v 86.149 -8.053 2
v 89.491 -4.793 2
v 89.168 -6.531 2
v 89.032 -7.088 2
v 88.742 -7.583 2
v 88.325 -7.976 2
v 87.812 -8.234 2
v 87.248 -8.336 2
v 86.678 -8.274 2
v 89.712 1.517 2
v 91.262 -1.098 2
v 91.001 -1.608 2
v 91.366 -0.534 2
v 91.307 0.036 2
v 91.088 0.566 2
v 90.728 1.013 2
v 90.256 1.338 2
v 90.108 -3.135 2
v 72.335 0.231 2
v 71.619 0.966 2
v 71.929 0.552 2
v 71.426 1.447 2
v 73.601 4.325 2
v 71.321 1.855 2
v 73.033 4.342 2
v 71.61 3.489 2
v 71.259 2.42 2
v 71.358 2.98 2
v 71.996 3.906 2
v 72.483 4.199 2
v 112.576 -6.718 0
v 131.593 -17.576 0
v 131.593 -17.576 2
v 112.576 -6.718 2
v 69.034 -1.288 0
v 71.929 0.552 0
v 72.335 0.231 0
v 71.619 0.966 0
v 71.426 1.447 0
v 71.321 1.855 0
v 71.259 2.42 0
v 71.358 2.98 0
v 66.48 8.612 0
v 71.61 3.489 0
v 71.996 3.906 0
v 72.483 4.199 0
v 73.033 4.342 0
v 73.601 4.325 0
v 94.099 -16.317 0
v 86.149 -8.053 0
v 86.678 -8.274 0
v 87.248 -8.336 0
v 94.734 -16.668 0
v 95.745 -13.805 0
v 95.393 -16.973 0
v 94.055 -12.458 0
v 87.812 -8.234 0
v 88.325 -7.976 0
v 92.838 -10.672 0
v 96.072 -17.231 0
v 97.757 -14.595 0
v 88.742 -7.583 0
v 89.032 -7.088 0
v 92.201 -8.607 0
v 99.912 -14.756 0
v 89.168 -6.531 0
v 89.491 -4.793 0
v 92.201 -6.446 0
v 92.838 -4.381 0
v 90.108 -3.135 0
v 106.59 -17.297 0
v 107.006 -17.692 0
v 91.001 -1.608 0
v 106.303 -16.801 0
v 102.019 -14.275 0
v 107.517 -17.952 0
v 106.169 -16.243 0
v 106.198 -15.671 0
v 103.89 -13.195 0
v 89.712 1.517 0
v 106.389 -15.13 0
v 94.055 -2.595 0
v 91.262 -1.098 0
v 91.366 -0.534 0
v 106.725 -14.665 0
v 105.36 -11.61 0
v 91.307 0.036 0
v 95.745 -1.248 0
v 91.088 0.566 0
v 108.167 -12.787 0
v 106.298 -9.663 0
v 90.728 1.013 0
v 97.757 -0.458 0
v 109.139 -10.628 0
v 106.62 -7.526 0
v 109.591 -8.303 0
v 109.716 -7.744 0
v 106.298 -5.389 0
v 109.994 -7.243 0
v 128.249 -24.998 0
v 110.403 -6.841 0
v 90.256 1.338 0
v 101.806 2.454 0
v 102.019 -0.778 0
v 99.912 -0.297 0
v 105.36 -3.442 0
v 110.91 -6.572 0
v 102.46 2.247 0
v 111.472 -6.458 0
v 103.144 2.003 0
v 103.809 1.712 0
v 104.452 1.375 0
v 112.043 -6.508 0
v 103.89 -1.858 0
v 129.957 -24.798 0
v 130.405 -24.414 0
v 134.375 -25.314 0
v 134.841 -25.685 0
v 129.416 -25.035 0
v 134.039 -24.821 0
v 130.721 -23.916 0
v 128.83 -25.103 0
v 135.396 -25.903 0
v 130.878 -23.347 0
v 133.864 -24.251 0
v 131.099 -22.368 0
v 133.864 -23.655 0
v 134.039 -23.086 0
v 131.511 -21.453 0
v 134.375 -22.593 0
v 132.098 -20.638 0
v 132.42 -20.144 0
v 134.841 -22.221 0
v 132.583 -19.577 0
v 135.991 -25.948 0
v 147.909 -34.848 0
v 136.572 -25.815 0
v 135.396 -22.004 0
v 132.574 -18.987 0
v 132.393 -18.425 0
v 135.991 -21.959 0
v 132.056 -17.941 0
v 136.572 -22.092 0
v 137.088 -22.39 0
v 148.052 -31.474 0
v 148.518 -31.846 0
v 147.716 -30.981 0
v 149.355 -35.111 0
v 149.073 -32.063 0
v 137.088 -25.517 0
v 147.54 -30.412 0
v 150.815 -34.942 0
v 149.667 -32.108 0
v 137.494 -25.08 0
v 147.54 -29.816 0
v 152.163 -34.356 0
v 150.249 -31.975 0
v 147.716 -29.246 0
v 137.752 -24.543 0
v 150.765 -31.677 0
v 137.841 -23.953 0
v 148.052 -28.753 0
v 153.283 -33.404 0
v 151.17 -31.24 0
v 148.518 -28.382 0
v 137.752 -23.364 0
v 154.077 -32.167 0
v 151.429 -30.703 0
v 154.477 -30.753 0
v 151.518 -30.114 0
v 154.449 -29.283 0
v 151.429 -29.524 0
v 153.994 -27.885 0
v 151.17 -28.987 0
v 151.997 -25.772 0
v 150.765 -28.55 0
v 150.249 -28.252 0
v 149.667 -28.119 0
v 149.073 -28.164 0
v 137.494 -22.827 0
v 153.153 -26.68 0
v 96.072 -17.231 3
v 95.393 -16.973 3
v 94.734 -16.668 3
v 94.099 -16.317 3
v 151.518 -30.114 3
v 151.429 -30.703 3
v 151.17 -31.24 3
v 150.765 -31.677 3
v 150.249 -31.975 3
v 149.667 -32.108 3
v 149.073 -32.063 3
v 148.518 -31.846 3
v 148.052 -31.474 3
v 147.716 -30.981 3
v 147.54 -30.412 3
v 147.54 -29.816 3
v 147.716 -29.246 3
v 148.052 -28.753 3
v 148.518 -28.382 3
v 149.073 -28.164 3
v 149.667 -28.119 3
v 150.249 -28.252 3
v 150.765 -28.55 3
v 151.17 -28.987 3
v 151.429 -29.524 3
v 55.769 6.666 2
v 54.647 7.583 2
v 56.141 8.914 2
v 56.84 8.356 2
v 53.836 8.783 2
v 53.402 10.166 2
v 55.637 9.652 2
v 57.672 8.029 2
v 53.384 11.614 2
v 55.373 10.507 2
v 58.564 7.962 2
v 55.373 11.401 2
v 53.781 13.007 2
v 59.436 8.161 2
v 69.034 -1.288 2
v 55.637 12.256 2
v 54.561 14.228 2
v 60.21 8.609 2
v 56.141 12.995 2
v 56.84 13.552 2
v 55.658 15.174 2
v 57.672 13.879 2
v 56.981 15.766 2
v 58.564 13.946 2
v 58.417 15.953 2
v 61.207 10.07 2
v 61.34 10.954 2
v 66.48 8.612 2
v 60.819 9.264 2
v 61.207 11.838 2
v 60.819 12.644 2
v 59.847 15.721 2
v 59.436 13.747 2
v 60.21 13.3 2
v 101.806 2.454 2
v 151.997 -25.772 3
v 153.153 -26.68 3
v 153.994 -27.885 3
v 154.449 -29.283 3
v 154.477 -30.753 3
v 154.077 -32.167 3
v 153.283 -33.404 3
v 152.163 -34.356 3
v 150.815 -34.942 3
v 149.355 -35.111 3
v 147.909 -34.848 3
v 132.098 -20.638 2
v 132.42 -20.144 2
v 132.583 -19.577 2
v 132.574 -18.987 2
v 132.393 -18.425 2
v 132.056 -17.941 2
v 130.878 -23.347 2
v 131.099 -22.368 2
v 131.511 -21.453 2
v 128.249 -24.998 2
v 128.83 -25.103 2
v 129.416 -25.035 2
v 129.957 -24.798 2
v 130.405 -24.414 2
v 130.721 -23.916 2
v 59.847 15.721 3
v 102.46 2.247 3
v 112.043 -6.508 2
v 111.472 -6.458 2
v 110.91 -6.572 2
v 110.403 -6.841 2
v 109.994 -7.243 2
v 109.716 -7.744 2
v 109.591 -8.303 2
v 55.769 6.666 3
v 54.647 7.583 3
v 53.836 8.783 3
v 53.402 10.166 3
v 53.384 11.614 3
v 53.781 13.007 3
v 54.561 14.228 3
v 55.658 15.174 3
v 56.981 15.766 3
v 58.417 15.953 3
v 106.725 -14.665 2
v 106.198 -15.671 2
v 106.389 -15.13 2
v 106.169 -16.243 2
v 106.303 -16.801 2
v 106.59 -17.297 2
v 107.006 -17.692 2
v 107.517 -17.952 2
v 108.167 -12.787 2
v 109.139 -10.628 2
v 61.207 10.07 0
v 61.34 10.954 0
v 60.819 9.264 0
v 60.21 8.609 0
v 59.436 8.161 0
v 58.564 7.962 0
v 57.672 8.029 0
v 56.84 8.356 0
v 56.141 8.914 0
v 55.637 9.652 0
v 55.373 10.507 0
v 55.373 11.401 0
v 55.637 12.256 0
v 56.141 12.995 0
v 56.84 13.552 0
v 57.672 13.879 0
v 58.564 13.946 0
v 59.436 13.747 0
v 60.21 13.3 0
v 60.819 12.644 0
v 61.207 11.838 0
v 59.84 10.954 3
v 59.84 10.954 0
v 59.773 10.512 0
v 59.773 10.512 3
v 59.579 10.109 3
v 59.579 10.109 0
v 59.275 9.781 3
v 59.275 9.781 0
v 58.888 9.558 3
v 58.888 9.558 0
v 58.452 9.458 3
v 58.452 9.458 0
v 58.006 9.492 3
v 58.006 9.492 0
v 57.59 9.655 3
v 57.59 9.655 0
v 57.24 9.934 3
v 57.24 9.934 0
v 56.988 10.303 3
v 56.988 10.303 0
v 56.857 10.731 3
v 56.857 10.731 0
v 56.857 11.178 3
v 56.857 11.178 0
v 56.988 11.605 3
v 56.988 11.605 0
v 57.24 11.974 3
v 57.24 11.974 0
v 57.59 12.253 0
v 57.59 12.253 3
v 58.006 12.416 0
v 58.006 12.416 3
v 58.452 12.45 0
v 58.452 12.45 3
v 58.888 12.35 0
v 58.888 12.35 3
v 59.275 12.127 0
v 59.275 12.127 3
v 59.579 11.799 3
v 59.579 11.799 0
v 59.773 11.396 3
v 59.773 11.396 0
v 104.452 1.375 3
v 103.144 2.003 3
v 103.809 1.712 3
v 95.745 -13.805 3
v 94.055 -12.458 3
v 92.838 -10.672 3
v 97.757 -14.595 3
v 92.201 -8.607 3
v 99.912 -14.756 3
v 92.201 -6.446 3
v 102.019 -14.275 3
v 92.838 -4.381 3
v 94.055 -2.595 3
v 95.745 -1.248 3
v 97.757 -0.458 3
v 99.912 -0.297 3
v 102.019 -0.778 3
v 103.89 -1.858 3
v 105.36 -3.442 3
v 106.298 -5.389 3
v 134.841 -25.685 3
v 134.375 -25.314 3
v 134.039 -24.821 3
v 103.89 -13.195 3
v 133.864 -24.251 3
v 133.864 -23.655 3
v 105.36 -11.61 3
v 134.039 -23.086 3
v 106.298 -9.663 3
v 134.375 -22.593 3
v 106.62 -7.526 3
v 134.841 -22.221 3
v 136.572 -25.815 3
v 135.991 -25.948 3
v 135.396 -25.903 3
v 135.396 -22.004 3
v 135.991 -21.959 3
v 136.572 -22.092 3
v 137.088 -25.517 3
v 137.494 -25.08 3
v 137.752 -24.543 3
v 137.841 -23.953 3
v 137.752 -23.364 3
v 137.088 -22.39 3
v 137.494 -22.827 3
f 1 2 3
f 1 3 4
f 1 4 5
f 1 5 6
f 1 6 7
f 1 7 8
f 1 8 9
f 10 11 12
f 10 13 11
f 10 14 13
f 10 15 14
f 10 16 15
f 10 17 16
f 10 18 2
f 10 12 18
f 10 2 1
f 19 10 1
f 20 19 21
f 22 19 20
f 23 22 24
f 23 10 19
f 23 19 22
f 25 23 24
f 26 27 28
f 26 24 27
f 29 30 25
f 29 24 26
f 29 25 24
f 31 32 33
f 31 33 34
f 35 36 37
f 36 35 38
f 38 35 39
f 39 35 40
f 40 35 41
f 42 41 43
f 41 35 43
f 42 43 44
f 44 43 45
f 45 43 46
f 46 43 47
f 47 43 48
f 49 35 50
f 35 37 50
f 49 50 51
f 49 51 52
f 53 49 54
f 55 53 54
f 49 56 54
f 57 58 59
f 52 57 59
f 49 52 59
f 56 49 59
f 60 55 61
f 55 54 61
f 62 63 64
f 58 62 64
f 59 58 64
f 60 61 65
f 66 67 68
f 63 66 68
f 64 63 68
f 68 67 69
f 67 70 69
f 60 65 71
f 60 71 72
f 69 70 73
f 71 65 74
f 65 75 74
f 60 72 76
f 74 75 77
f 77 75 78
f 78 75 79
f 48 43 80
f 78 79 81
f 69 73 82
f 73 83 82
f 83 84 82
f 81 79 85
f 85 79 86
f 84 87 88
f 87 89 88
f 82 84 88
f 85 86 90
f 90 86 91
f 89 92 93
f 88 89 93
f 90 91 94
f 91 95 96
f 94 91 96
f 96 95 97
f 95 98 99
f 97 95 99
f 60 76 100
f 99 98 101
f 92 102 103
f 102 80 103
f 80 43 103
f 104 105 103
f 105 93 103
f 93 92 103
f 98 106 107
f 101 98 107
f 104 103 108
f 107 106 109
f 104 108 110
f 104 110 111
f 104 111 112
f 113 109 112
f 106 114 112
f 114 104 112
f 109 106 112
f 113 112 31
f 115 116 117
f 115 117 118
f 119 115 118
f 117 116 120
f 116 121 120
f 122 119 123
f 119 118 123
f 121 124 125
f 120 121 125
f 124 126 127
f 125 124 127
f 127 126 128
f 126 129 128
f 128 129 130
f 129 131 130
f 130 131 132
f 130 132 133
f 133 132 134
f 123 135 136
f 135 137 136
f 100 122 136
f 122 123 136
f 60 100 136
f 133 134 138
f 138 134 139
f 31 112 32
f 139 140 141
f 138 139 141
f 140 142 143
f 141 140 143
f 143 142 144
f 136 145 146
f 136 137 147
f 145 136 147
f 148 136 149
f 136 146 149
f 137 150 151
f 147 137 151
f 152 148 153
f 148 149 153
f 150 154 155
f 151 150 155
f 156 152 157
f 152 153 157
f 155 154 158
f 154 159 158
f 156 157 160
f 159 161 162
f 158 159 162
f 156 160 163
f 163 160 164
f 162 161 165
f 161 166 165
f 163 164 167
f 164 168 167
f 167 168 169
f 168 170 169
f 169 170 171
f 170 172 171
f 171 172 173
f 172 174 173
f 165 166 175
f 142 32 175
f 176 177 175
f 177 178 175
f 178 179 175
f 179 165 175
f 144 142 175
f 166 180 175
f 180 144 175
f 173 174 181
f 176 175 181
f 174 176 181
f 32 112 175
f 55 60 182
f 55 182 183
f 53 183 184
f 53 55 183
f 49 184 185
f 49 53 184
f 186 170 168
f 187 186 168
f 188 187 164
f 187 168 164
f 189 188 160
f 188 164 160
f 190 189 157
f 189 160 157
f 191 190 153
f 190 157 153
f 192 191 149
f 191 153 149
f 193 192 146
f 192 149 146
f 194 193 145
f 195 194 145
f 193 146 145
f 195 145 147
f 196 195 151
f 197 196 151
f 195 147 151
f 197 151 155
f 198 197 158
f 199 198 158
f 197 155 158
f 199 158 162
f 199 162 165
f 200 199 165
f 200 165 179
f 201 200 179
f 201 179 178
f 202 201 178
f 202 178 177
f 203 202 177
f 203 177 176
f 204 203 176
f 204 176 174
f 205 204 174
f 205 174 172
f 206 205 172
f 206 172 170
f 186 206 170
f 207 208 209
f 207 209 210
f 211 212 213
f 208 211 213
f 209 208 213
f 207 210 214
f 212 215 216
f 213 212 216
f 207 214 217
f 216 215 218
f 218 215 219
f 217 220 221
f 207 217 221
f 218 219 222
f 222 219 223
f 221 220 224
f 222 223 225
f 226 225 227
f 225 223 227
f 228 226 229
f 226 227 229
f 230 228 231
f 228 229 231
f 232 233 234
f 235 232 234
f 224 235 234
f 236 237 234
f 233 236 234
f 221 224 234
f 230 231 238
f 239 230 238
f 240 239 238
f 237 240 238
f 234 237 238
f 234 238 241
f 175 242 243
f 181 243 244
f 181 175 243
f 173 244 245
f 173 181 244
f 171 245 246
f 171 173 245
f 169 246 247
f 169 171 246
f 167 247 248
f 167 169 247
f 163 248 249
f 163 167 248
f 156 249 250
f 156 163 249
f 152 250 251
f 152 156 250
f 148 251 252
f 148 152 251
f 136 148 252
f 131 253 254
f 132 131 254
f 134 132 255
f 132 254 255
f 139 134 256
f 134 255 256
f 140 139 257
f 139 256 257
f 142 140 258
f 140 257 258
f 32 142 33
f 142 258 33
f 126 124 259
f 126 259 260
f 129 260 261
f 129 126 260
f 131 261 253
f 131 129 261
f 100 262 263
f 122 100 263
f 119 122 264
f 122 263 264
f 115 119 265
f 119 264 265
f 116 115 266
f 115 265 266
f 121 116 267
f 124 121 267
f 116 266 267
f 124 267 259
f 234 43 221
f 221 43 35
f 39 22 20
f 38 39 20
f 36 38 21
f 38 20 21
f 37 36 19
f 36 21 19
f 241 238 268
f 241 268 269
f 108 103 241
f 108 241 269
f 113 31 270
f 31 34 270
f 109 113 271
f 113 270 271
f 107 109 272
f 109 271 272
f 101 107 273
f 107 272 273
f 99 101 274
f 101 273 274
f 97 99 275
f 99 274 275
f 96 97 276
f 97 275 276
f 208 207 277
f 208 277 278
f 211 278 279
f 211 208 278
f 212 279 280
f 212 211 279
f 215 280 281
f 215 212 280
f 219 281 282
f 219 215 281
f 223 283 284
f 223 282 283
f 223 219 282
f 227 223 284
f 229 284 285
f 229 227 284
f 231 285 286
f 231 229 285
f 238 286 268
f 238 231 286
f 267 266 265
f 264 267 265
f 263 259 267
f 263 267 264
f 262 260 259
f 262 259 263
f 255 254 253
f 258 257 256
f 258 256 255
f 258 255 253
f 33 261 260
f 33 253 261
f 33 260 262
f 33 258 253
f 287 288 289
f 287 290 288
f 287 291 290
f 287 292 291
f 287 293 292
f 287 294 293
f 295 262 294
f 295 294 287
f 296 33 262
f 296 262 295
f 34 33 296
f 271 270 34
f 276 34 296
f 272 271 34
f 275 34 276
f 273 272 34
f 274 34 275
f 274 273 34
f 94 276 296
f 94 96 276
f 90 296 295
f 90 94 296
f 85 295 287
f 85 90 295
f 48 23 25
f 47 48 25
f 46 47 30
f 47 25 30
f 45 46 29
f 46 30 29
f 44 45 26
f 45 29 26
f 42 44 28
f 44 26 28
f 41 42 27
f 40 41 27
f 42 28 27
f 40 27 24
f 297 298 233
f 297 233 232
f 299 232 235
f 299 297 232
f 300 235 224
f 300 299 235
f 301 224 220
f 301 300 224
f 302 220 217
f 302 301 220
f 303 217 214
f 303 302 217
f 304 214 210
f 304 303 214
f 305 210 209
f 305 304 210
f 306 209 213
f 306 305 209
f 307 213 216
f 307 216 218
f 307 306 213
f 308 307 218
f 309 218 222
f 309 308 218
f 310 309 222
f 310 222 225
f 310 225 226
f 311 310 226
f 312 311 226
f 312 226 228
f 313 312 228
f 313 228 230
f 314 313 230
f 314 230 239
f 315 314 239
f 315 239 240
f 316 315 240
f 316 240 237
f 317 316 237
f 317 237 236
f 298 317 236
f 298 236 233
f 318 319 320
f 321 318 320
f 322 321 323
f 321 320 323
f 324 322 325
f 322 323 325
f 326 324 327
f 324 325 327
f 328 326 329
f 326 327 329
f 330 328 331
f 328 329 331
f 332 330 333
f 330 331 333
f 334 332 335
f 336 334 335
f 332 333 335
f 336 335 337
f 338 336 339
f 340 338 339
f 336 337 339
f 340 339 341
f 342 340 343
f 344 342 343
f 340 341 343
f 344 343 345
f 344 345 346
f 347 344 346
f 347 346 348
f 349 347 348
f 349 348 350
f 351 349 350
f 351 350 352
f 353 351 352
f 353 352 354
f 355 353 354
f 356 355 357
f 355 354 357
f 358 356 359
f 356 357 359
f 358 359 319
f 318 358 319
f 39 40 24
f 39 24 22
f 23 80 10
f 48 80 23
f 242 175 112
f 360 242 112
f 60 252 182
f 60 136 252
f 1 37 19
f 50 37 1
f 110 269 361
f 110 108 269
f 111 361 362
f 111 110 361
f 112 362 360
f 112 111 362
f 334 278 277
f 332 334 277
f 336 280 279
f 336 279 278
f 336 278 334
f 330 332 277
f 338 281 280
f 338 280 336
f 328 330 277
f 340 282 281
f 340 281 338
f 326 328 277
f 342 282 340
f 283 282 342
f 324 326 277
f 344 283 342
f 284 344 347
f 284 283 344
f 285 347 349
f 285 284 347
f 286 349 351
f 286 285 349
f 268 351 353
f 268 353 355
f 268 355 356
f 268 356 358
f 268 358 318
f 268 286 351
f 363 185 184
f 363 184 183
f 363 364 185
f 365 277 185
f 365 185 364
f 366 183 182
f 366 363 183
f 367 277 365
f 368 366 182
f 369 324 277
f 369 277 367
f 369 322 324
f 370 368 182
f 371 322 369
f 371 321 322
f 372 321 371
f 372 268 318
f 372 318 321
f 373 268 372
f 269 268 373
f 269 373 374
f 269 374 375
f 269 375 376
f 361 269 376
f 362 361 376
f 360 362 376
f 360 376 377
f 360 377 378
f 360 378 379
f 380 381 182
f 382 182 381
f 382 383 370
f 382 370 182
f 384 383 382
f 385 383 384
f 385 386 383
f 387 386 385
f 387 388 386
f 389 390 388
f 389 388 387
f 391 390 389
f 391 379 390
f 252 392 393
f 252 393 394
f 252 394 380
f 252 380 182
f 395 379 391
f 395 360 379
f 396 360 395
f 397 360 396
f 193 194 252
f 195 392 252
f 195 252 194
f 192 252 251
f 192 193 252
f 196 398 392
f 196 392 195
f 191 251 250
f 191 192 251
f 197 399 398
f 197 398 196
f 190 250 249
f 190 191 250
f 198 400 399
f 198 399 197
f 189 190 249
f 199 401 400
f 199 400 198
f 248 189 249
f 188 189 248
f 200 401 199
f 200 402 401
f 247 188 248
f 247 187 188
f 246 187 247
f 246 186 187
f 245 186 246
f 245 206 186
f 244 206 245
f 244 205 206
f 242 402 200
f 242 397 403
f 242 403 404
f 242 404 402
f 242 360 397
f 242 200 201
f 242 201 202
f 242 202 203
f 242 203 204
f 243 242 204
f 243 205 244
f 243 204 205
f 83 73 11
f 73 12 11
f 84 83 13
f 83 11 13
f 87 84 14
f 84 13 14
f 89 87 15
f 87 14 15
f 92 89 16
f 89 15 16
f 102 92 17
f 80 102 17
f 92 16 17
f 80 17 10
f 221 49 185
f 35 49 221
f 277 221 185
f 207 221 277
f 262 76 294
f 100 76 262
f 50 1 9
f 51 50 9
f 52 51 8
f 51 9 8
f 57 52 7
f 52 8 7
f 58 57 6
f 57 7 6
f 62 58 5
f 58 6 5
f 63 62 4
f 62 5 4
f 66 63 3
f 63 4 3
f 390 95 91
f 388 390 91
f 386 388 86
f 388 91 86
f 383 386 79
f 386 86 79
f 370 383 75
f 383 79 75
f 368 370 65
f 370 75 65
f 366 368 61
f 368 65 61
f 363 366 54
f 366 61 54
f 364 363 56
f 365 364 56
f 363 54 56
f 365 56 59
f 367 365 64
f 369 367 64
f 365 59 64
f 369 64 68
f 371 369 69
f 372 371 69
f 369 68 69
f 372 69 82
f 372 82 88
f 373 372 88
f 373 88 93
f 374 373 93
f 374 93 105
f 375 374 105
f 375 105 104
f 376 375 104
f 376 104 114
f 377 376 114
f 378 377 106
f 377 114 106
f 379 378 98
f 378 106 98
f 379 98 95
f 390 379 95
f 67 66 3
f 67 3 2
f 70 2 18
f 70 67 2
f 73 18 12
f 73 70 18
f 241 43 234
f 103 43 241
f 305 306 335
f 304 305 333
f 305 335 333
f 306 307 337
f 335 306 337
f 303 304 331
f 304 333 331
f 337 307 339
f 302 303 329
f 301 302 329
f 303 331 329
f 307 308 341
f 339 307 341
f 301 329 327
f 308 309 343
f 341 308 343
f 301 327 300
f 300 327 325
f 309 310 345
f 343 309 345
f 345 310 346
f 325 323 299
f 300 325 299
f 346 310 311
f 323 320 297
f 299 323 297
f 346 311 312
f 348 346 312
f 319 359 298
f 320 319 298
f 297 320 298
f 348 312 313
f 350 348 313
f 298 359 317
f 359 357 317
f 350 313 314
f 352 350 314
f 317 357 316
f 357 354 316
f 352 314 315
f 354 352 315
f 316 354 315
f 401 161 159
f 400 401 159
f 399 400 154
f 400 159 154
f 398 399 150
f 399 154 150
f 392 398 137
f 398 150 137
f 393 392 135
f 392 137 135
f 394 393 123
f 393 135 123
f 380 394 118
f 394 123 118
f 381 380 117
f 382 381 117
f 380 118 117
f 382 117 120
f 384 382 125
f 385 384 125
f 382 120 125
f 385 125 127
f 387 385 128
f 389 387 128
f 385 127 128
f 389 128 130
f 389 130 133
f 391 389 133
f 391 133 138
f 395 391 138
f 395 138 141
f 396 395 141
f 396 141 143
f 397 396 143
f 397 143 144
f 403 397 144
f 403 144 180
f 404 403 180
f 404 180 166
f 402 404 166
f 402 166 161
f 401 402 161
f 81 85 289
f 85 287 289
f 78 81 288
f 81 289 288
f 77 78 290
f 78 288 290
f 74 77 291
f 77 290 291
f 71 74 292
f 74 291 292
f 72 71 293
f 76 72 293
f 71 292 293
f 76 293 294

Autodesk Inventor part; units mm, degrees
ref_plane "YZ Plane" through (0, 0, 0) normal (1, 0, 0) x (0, 1, 0)
ref_plane "XZ Plane" through (0, 0, 0) normal (0, 1, 0) x (-1, 0, 0)
ref_plane "XY Plane" through (0, 0, 0) normal (0, 0, 1) x (1, 0, 0)
sketch "スケッチ1" plane through (0, 0, 0) normal (0, 0, 1) x (1, 0, 0)
  line L0 (-170.6512, -31.4118) -> (202.8656, -31.4118) construction
  circle A0 centre (-14, -17.4118) radius 14 construction
  circle A1 centre (14, -17.4118) radius 14 construction
  circle A2 centre (-28.0204, 0.0121) radius 20.05 construction
  circle A3 centre (-28.0204, 0.0121) radius 5.05 construction
  circle A4 centre (8.8763, 3.8907) radius 32.05 construction
  circle A5 centre (8.8763, 3.8907) radius 10.1 construction
  circle A6 centre (54.047, 13.5882) radius 36.1 construction
  line L1 (-170.915, -81.4118) -> (490.0044, -81.4118)
  circle A7 centre (-28.0204, 0.0121) radius 22.342 construction
  circle A8 centre (-39.4931, 19.1835) radius 14 construction
  circle A9 centre (-49.0547, 7.5438) radius 14 construction
  circle A10 centre (-49.0547, -7.5196) radius 14 construction
  circle A11 centre (-39.4931, -19.1593) radius 14 construction
  circle A12 centre (8.8763, 3.8907) radius 33.05 construction
  circle A13 centre (54.047, 13.5882) radius 38.1 construction
  line L2 (-11.5565, -29.1593) -> (4.2969, -29.1593) construction
  line L3 (-67.2952, 44.8622) -> (-67.2952, -57.3934) construction
  line L4 (-149.4523, -1.6098) -> (-132.6633, -31.6026)
  line L5 (-132.7701, -31.4118) -> (-132.7701, 74.0456)
  circle A14 centre (-11.4931, -19.1593) radius 14 construction
  line L6 (-197.2268, -33.1593) -> (179.6604, -33.1593) construction
  circle A15 centre (54.047, 13.5882) radius 4.025 construction
  circle A16 centre (54.047, 13.5882) radius 6 construction
  circle A17 centre (-39.4931, 19.1835) radius 5
  circle A18 centre (-49.0547, 7.5438) radius 5
  circle A19 centre (-49.0547, -7.5196) radius 5
  circle A20 centre (-39.4931, -19.1593) radius 5
  circle A21 centre (-39.4931, 19.1835) radius 8 construction
  circle A22 centre (-49.0547, 7.5438) radius 8 construction
  circle A23 centre (-49.0547, -7.5196) radius 8 construction
  circle A24 centre (-39.4931, -19.1593) radius 8 construction
  circle A25 centre (-28.0204, 0.0121) radius 4.5
  circle A26 centre (8.8763, 3.8907) radius 7.5
  line L7 (-17.5497, 32.3149) -> (-46.3578, 15.0755) construction
  line L8 (-46.3578, 15.0755) -> (-51.7515, 0.0121) construction
  line L9 (-51.7515, 0.0121) -> (-46.3578, -15.0513) construction
  line L10 (-46.3578, -15.0513) -> (-37.9391, -20.0892) construction
  circle A27 centre (-32.6283, 23.2915) radius 1.3
  circle A28 centre (-46.3578, 15.0755) radius 1.3
  circle A29 centre (-51.7515, 0.0121) radius 1.3
  circle A30 centre (-46.3578, -15.0513) radius 1.3
  circle A31 centre (-32.6283, -23.2673) radius 1.3
  line L11 (-67.2952, 23.1796) -> (-67.2952, -18.1327)
  arc A32 (79.2003, -37.212) -> (87.3507, -31.2711) centre (80.4159, -30.3183) ccw
  arc A33 (8.1864, 50.8943) -> (0.9804, 51.9708) centre (3.7003, 45.5208) ccw
  line L12 (-52.2685, -33.1593) -> (56.2168, -33.1593)
  line L13 (56.2168, -33.1593) -> (79.2003, -37.212)
  arc A34 (92.7831, 8.2659) -> (29.742, 44.2162) centre (54.047, 13.5882) ccw
  line L14 (87.3507, -31.2711) -> (92.7831, 8.2659)
  line L15 (0.9804, 51.9708) -> (-67.2952, 23.1796)
  circle A35 centre (34.0114, -24.0061) radius 4.5 construction
  circle A36 centre (34.0114, -24.0061) radius 1.5
  circle A37 centre (-21.4477, 26.0369) radius 4.5 construction
  circle A38 centre (-21.4477, 26.0369) radius 1.5
  circle A39 centre (-56.0504, 23.0377) radius 1.5
  circle A40 centre (-56.0504, 23.0377) radius 3 construction
  circle A41 centre (-56.0504, 23.0377) radius 4.5 construction
  circle A42 centre (-64.2952, 0.0121) radius 1.5
  circle A43 centre (-64.2952, 0.0121) radius 3 construction
  circle A44 centre (-64.2952, 0.0121) radius 4.3311 construction
  line L16 (54.047, 13.5882) -> (99.37, -7.5264)
  line L17 (99.37, -7.5264) -> (58.3399, 10.9541)
  line L18 (58.3399, 10.9541) -> (30.7326, 32.4678)
  line L19 (30.7326, 32.4678) -> (54.047, 13.5882)
  line L20 (99.37, -7.5264) -> (491.4359, -184.1173)
  line L21 (-183.2789, 162.2213) -> (-183.2789, -125.2315)
  line L22 (516.7211, 155.5913) -> (516.7211, -155.5644)
  circle A45 centre (99.37, -7.5264) radius 7.25
  line L23 (149.518, -30.1136) -> (397.5027, -198.9436) construction
  line L24 (220.2014, -78.2354) -> (225.3858, -8.4277) construction
  circle A46 centre (3.7003, 45.5208) radius 4
  circle A47 centre (135.8413, -23.9534) radius 2
  circle A48 centre (149.518, -30.1136) radius 2
  arc A49 (147.9092, -34.8477) -> (151.9972, -25.7715) centre (149.518, -30.1136) ccw
  line L25 (147.9092, -34.8477) -> (96.0719, -17.2312)
  line L26 (151.9972, -25.7715) -> (104.4523, 1.3749)
  circle A50 centre (30.7326, 32.4678) radius 2
  circle A51 centre (-16.1798, -24.0771) radius 4.5 construction
  circle A52 centre (-16.1798, -24.0771) radius 1.5
  line L27 (-67.2952, -18.1327) -> (-52.2685, -33.1593)
  circle A53 centre (-56.0504, -23.0135) radius 1.5
  circle A54 centre (-56.0504, -23.0135) radius 3 construction
  circle A55 centre (30.7326, 32.4678) radius 4
  arc A56 (56.8403, 15.6972) -> (51.3644, 11.3402) centre (54.047, 13.5882) ccw construction
  line L28 (96.4916, -6.1854) -> (101.9705, -5.7041) construction
  line L29 (101.9705, -5.7041) -> (99.6479, -10.6896) construction
  line L30 (99.6479, -10.6896) -> (96.4916, -6.1854) construction
  circle A57 centre (99.6479, -10.6896) radius 1.5
  circle A58 centre (101.9705, -5.7041) radius 1.5
  circle A59 centre (96.4916, -6.1854) radius 1.5
  circle A60 centre (99.37, -7.5264) radius 6
  arc A61 (97.7876, -15.8778) -> (97.5111, 0.7679) centre (99.37, -7.5264) ccw
  arc A62 (56.8403, 15.6972) -> (97.5111, 0.7679) centre (88.7632, 39.7996) ccw
  arc A63 (51.3644, 11.3402) -> (97.7876, -15.8778) centre (112.6811, 62.7237) ccw
  circle A64 centre (54.047, 13.5882) radius 8.5 construction
  line L31 (102.9595, 0.1786) -> (57.6365, 21.2931) construction
  line L32 (50.4575, 5.8833) -> (95.7806, -15.2313) construction
  circle A65 centre (12.7384, 41.2415) radius 3 construction
  circle A66 centre (12.7384, 41.2415) radius 4.5 construction
  circle A67 centre (12.7384, 41.2415) radius 1.5
  circle A68 centre (80.4159, -30.3183) radius 4
  circle A69 centre (69.7531, -26.0108) radius 1.5
  circle A70 centre (69.7531, -26.0108) radius 4.5 construction
  circle A71 centre (-56.0504, -23.0135) radius 4.5 construction
  line L33 (8.1864, 50.8943) -> (15.9809, 44.3871)
  arc A72 (15.9809, 44.3871) -> (29.742, 44.2162) centre (22.9664, 52.7545) ccw
  circle A73 centre (-5.4761, 38.5895) radius 1.5
  circle A74 centre (-5.4761, 38.5895) radius 4.5 construction
  circle A75 centre (54.047, 13.5882) radius 50 construction
  circle A76 centre (3.7003, 45.5208) radius 2
  circle A77 centre (80.4159, -30.3183) radius 2
  circle A78 centre (54.047, 13.5882) radius 1.5
  circle A79 centre (58.3399, 10.9541) radius 1.5
  circle A80 centre (58.3399, 10.9541) radius 3
  arc A81 (59.8474, 15.7214) -> (55.7687, 6.6659) centre (58.3399, 10.9541) ccw
  line L34 (94.099, -16.3172) -> (55.7687, 6.6659)
  line L35 (59.8474, 15.7214) -> (102.4604, 2.2467)
  arc A82 (104.4523, 1.3749) -> (102.4604, 2.2467) centre (99.37, -7.5264) ccw
  arc A83 (94.099, -16.3172) -> (96.0719, -17.2312) centre (99.37, -7.5264) ccw
  circle A84 centre (30.7326, 32.4678) radius 5.025
  circle A85 centre (30.7326, 32.4678) radius 8.025
  circle A86 centre (58.3399, 10.9541) radius 4.025
  circle A87 centre (58.3399, 10.9541) radius 7.025
  line L36 (25.9827, 25.9995) -> (54.1819, 5.2918)
  line L37 (53.3095, 15.8577) -> (37.1861, 27.6978)
  line L38 (65.3516, 11.3852) -> (66.2721, -3.5865)
  line L39 (66.2721, -3.5865) -> (54.1819, 5.2918)
  line L40 (66.4799, 8.6117) -> (69.0337, -1.2879)
  line L41 (66.4799, 8.6117) -> (101.8062, 2.4535)
  point P0 (0, 0)
  point P1 (0, 0)
  point P2 (-49.0547, 7.5438)
  point P3 (-49.0547, -7.5196)
  dimension "d88" = 100
  dimension "d0" = 40.1
  dimension "d1" = 10.1
  dimension "d2" = 64.1
  dimension "d3" = 20.2
  dimension "d4" = 72.2
  dimension "d5" = 95
  dimension "d6" = 44.684
  dimension "d7" = 28
  dimension "d8" = 28
  dimension "d9" = 28
  dimension "d10" = 28
  dimension "d11" = 1
  dimension "d12" = 2
  dimension "d13" = 4
  dimension "d14" = 8.05
  dimension "d15" = 12
  dimension "d16" = 10
  dimension "d17" = 10
  dimension "d18" = 10
  dimension "d19" = 10
  dimension "d20" = 3
  dimension "d21" = 3
  dimension "d22" = 3
  dimension "d23" = 3
  dimension "d24" = 9
  dimension "d25" = 15
  dimension "d26" = 2.6
  dimension "d27" = 2.6
  dimension "d28" = 2.6
  dimension "d29" = 2.6
  dimension "d30" = 2.6
  dimension "d31" = 1
  dimension "d32" = 9
  dimension "d33" = 3
  dimension "d34" = 9
  dimension "d35" = 3
  dimension "d36" = 3
  dimension "d37" = 6
  dimension "d38" = 9
  dimension "d39" = 3
  dimension "d40" = 6
  dimension "d41" = 50
  dimension "d42" = 45
  dimension "d43" = 35
  dimension "d44" = 30
  dimension "d45" = 39
  dimension "d46" = 430
  dimension "d47" = 700
  dimension "d48" = 14.5
  dimension "d49" = 300
  dimension "d50" = 10
  dimension "d51" = 70
  dimension "d52" = 120
  dimension "d53" = 140
  dimension "d54" = 8
  dimension "d55" = 4
  dimension "d56" = 4
  dimension "d57" = 15
  dimension "d58" = 40
  dimension "d59" = 10
  dimension "d60" = 4
  dimension "d61" = 9
  dimension "d62" = 3
  dimension "d63" = 3
extrude "押し出し1" add sketch "スケッチ1" along normal blind 3 contours L35 L41 L14 | L14 L41 L40 L16 L38 A87 L35 | L34 L40 A62 L17 L14 | L14 L17 A45 L20 A61 A63 L34 | A63 A61 L20 A47 A48 A49 L25 A83 L34 | L41 L35 A82 L26 A49 L20 A48 A47 A61 A62 L14 | L14 A62 L16 L40 L41 | A87 L16 A62 A86 A78 A81 L35 | L17 A62 L16 L14 | L14 L16 A45 L17 | L34 L38 A62 L40 | L34 A87 A62 L38 | A62 A61 L20 A45 L16 L14 | L14 L16 A62 | L38 L16 A87 | A62 L40 L17 | L17 L40 L16 A62 | A62 L38 L17 L40 | A81 A63 | A63 A81 A78 A86 L17 A62 A87 L34 | A62 A87 L17 L38 | L40 L17 L38 L16 | A78 A86 L18 A81 | L38 L17 A87 L16 | A62 L17 A87 | A86 A62 A80 L18 A78 | A78 L18 A86 | L18 A86 L16 A81 | A87 L17 A62 L16 | A81 L16 A86 A78 | L17 A86 L16 A62 | A86 A62 A80 | L18 A78 L16 A86 | L16 A86 A62 | A86 L16 A78 | A78 L16 A80 L17 A86 | L17 A80 L16 A86 | L18 A80 L16 A78 | A80 A62 | A62 A80 L16 A79 L18 | L16 A80 A62 A86 | A80 L16 L18 A79 L17 | L17 A79 L16 A80 | L18 L16 A80 | L16 A79 L18
extrude "押し出し2" cut sketch "スケッチ1" along normal blind 2 contours L35 L41 L14 | L14 L41 L40 L16 L38 A87 L35 | A87 L16 A62 A86 A78 A81 L35 | L34 L38 A62 L40 | L34 A87 A62 L38 | L38 L16 A87 | A62 L38 L17 L40 | A81 A63 | A63 A81 A78 A86 L17 A62 A87 L34 | A62 A87 L17 L38 | L40 L17 L38 L16 | A78 A86 L18 A81 | L38 L17 A87 L16 | A62 L17 A87 | A86 A62 A80 L18 A78 | A78 L18 A86 | L18 A86 L16 A81 | A87 L17 A62 L16 | A81 L16 A86 A78 | L17 A86 L16 A62 | A86 A62 A80 | L18 A78 L16 A86 | L16 A86 A62 | A86 L16 A78 | A78 L16 A80 L17 A86 | L17 A80 L16 A86 | L18 A80 L16 A78 | L16 A80 A62 A86
sketch "スケッチ3" plane through (0, 0, 0) normal (0, 0, -1) x (-1, 0, 0)
  line L0 (-66.4799, 8.6117) -> (-101.8062, 2.4535) projected
  line L1 (-102.4604, 2.2467) -> (-101.8062, 2.4535) projected
  arc A0 (-102.4604, 2.2467) -> (-104.4523, 1.3749) centre (-99.37, -7.5264) ccw projected
  line L2 (-151.9972, -25.7715) -> (-104.4523, 1.3749) projected
  arc A1 (-151.9972, -25.7715) -> (-147.9092, -34.8477) centre (-149.518, -30.1136) ccw projected
  line L3 (-96.0719, -17.2312) -> (-147.9092, -34.8477) projected
  arc A2 (-96.0719, -17.2312) -> (-94.099, -16.3172) centre (-99.37, -7.5264) ccw projected
  line L4 (-69.0337, -1.2879) -> (-94.099, -16.3172) projected
  line L5 (-69.0337, -1.2879) -> (-66.4799, 8.6117) projected
  circle A3 centre (-135.8413, -23.9534) radius 2 projected
  circle A4 centre (-149.518, -30.1136) radius 2 projected
  circle A5 centre (-99.37, -7.5264) radius 7.25 projected
  arc A6 (-101.5559, -0.6137) -> (-102.9648, -1.2303) centre (-99.37, -7.5264) ccw
  line L6 (-101.5559, -0.6137) -> (-101.0932, -0.4674)
  line L7 (-101.0932, -0.4674) -> (-70.5466, 4.8575)
  line L8 (-70.5466, 4.8575) -> (-71.6313, 0.6525)
  line L9 (-71.6313, 0.6525) -> (-95.6417, -13.7443)
  arc A7 (-97.0372, -14.3908) -> (-95.6417, -13.7443) centre (-99.37, -7.5264) ccw
  line L10 (-97.0372, -14.3908) -> (-148.8745, -32.0072)
  arc A8 (-150.5097, -28.3767) -> (-148.8745, -32.0072) centre (-149.518, -30.1136) ccw
  line L11 (-150.5097, -28.3767) -> (-102.9648, -1.2303)
  arc A9 (-131.2941, -26.0327) -> (-134.3851, -19.1702) centre (-135.8413, -23.9534) ccw
  arc A10 (-109.2571, -4.823) -> (-103.8976, -16.7222) centre (-99.37, -7.5264) ccw
  arc A11 (-89.4275, -10.0182) -> (-93.477, 0.8602) centre (-99.37, -7.5264) ccw
  point P0 (0, 0)
  dimension "d111" = 3
  dimension "d113" = 3
  dimension "d114" = 3
  dimension "d115" = 3
extrude "押し出し3" cut sketch "スケッチ3" against normal blind 2 contours L11 A10 L10 A9 | A11 L7 L8 L9
fillet "フィレット1" radius 2 8 edges at (134.3851, -19.1702, 1) (131.2941, -26.0327, 1) (103.8976, -16.7222, 1) (109.2571, -4.823, 1) (93.477, 0.8602, 1) (89.4275, -10.0182, 1) (71.6313, 0.6525, 1) (70.5466, 4.8575, 1)
sketch "スケッチ4" plane through (0, 0, 0) normal (0, 0, -1) x (-1, 0, 0)
  arc A0 (-89.1684, -6.5314) -> (-91.0011, -1.6084) centre (-99.37, -7.5264) ccw projected
  arc A1 (-89.7115, 1.5167) -> (-91.0011, -1.6084) centre (-89.3681, -0.4536) ccw projected
  line L0 (-89.7115, 1.5167) -> (-73.6012, 4.325) projected
  arc A2 (-71.3211, 1.8552) -> (-73.6012, 4.325) centre (-73.2577, 2.3548) ccw projected
  line L1 (-71.3211, 1.8552) -> (-71.4265, 1.4465) projected
  arc A3 (-72.3346, 0.2308) -> (-71.4265, 1.4465) centre (-73.3631, 1.9461) ccw projected
  line L2 (-72.3346, 0.2308) -> (-86.1494, -8.0526) projected
  arc A4 (-89.1684, -6.5314) -> (-86.1494, -8.0526) centre (-87.1779, -6.3373) ccw projected
  arc A5 (-130.8782, -23.3469) -> (-132.0981, -20.6385) centre (-135.8413, -23.9534) ccw projected
  arc A6 (-131.5925, -17.5757) -> (-132.0981, -20.6385) centre (-130.6008, -19.3125) ccw projected
  line L3 (-131.5925, -17.5757) -> (-112.5765, -6.7182) projected
  arc A7 (-109.5905, -8.3034) -> (-112.5765, -6.7182) centre (-111.5848, -8.4551) ccw projected
  arc A8 (-109.5905, -8.3034) -> (-106.725, -14.6655) centre (-99.37, -7.5264) ccw projected
  arc A9 (-107.5166, -17.9521) -> (-106.725, -14.6655) centre (-108.1601, -16.0585) ccw projected
  line L4 (-107.5166, -17.9521) -> (-128.2494, -24.998) projected
  arc A10 (-130.8782, -23.3469) -> (-128.2494, -24.998) centre (-128.893, -23.1043) ccw projected
  line L5 (-66.4799, 8.6117) -> (-101.8062, 2.4535) projected
  line L6 (-102.4604, 2.2467) -> (-101.8062, 2.4535) projected
  arc A11 (-102.4604, 2.2467) -> (-104.4523, 1.3749) centre (-99.37, -7.5264) ccw projected
  line L7 (-151.9972, -25.7715) -> (-104.4523, 1.3749) projected
  arc A12 (-151.9972, -25.7715) -> (-147.9092, -34.8477) centre (-149.518, -30.1136) ccw projected
  line L8 (-96.0719, -17.2312) -> (-147.9092, -34.8477) projected
  arc A13 (-96.0719, -17.2312) -> (-94.099, -16.3172) centre (-99.37, -7.5264) ccw projected
  line L9 (-69.0337, -1.2879) -> (-94.099, -16.3172) projected
  line L10 (-69.0337, -1.2879) -> (-66.4799, 8.6117) projected
  circle A14 centre (-135.8413, -23.9534) radius 2 projected
  circle A15 centre (-149.518, -30.1136) radius 2 projected
  circle A16 centre (-99.37, -7.5264) radius 7.25 projected
  arc A17 (-55.7687, 6.6659) -> (-59.8474, 15.7214) centre (-58.3399, 10.9541) ccw projected
  line L11 (-101.8062, 2.4535) -> (-59.8474, 15.7214) projected
  line L12 (-66.4799, 8.6117) -> (-101.8062, 2.4535) projected
  line L13 (-69.0337, -1.2879) -> (-66.4799, 8.6117) projected
  line L14 (-55.7687, 6.6659) -> (-69.0337, -1.2879) projected
  circle A18 centre (-58.3399, 10.9541) radius 3 projected
  arc A19 (-151.9972, -25.7715) -> (-147.9092, -34.8477) centre (-149.518, -30.1136) ccw projected
  line L15 (-151.9972, -25.7715) -> (-104.4523, 1.3749) projected
  arc A20 (-102.4604, 2.2467) -> (-104.4523, 1.3749) centre (-99.37, -7.5264) ccw projected
  line L16 (-102.4604, 2.2467) -> (-59.8474, 15.7214) projected
  arc A21 (-55.7687, 6.6659) -> (-59.8474, 15.7214) centre (-58.3399, 10.9541) ccw projected
  line L17 (-55.7687, 6.6659) -> (-94.099, -16.3172) projected
  arc A22 (-96.0719, -17.2312) -> (-94.099, -16.3172) centre (-99.37, -7.5264) ccw projected
  line L18 (-96.0719, -17.2312) -> (-147.9092, -34.8477) projected
  circle A23 centre (-135.8413, -23.9534) radius 2 projected
  circle A24 centre (-149.518, -30.1136) radius 2 projected
  circle A25 centre (-99.37, -7.5264) radius 7.25 projected
  circle A26 centre (-58.3399, 10.9541) radius 1.5 projected
  arc A27 (-102.2781, 4.4966) -> (-101.8062, 2.4535) centre (-101.9865, 3.4879) ccw
  arc A28 (-69.0337, -1.2879) -> (-67.4295, -2.4205) centre (-68.017, -1.5502) ccw
  line L19 (-66.4799, 8.6117) -> (-101.8062, 2.4535) projected
  line L20 (-102.2781, 4.4966) -> (-60.0063, 16.718)
  line L21 (-67.4295, -2.4205) -> (-54.983, 5.981)
  arc A29 (-54.983, 5.981) -> (-60.0063, 16.718) centre (-58.3399, 10.9541) ccw
  point P0 (0, 0)
  dimension "d119" = 2.1
  dimension "d120" = 2.1
  dimension "d121" = 1
properties part number "アーム中間節" material "アルミニウム 7075"
